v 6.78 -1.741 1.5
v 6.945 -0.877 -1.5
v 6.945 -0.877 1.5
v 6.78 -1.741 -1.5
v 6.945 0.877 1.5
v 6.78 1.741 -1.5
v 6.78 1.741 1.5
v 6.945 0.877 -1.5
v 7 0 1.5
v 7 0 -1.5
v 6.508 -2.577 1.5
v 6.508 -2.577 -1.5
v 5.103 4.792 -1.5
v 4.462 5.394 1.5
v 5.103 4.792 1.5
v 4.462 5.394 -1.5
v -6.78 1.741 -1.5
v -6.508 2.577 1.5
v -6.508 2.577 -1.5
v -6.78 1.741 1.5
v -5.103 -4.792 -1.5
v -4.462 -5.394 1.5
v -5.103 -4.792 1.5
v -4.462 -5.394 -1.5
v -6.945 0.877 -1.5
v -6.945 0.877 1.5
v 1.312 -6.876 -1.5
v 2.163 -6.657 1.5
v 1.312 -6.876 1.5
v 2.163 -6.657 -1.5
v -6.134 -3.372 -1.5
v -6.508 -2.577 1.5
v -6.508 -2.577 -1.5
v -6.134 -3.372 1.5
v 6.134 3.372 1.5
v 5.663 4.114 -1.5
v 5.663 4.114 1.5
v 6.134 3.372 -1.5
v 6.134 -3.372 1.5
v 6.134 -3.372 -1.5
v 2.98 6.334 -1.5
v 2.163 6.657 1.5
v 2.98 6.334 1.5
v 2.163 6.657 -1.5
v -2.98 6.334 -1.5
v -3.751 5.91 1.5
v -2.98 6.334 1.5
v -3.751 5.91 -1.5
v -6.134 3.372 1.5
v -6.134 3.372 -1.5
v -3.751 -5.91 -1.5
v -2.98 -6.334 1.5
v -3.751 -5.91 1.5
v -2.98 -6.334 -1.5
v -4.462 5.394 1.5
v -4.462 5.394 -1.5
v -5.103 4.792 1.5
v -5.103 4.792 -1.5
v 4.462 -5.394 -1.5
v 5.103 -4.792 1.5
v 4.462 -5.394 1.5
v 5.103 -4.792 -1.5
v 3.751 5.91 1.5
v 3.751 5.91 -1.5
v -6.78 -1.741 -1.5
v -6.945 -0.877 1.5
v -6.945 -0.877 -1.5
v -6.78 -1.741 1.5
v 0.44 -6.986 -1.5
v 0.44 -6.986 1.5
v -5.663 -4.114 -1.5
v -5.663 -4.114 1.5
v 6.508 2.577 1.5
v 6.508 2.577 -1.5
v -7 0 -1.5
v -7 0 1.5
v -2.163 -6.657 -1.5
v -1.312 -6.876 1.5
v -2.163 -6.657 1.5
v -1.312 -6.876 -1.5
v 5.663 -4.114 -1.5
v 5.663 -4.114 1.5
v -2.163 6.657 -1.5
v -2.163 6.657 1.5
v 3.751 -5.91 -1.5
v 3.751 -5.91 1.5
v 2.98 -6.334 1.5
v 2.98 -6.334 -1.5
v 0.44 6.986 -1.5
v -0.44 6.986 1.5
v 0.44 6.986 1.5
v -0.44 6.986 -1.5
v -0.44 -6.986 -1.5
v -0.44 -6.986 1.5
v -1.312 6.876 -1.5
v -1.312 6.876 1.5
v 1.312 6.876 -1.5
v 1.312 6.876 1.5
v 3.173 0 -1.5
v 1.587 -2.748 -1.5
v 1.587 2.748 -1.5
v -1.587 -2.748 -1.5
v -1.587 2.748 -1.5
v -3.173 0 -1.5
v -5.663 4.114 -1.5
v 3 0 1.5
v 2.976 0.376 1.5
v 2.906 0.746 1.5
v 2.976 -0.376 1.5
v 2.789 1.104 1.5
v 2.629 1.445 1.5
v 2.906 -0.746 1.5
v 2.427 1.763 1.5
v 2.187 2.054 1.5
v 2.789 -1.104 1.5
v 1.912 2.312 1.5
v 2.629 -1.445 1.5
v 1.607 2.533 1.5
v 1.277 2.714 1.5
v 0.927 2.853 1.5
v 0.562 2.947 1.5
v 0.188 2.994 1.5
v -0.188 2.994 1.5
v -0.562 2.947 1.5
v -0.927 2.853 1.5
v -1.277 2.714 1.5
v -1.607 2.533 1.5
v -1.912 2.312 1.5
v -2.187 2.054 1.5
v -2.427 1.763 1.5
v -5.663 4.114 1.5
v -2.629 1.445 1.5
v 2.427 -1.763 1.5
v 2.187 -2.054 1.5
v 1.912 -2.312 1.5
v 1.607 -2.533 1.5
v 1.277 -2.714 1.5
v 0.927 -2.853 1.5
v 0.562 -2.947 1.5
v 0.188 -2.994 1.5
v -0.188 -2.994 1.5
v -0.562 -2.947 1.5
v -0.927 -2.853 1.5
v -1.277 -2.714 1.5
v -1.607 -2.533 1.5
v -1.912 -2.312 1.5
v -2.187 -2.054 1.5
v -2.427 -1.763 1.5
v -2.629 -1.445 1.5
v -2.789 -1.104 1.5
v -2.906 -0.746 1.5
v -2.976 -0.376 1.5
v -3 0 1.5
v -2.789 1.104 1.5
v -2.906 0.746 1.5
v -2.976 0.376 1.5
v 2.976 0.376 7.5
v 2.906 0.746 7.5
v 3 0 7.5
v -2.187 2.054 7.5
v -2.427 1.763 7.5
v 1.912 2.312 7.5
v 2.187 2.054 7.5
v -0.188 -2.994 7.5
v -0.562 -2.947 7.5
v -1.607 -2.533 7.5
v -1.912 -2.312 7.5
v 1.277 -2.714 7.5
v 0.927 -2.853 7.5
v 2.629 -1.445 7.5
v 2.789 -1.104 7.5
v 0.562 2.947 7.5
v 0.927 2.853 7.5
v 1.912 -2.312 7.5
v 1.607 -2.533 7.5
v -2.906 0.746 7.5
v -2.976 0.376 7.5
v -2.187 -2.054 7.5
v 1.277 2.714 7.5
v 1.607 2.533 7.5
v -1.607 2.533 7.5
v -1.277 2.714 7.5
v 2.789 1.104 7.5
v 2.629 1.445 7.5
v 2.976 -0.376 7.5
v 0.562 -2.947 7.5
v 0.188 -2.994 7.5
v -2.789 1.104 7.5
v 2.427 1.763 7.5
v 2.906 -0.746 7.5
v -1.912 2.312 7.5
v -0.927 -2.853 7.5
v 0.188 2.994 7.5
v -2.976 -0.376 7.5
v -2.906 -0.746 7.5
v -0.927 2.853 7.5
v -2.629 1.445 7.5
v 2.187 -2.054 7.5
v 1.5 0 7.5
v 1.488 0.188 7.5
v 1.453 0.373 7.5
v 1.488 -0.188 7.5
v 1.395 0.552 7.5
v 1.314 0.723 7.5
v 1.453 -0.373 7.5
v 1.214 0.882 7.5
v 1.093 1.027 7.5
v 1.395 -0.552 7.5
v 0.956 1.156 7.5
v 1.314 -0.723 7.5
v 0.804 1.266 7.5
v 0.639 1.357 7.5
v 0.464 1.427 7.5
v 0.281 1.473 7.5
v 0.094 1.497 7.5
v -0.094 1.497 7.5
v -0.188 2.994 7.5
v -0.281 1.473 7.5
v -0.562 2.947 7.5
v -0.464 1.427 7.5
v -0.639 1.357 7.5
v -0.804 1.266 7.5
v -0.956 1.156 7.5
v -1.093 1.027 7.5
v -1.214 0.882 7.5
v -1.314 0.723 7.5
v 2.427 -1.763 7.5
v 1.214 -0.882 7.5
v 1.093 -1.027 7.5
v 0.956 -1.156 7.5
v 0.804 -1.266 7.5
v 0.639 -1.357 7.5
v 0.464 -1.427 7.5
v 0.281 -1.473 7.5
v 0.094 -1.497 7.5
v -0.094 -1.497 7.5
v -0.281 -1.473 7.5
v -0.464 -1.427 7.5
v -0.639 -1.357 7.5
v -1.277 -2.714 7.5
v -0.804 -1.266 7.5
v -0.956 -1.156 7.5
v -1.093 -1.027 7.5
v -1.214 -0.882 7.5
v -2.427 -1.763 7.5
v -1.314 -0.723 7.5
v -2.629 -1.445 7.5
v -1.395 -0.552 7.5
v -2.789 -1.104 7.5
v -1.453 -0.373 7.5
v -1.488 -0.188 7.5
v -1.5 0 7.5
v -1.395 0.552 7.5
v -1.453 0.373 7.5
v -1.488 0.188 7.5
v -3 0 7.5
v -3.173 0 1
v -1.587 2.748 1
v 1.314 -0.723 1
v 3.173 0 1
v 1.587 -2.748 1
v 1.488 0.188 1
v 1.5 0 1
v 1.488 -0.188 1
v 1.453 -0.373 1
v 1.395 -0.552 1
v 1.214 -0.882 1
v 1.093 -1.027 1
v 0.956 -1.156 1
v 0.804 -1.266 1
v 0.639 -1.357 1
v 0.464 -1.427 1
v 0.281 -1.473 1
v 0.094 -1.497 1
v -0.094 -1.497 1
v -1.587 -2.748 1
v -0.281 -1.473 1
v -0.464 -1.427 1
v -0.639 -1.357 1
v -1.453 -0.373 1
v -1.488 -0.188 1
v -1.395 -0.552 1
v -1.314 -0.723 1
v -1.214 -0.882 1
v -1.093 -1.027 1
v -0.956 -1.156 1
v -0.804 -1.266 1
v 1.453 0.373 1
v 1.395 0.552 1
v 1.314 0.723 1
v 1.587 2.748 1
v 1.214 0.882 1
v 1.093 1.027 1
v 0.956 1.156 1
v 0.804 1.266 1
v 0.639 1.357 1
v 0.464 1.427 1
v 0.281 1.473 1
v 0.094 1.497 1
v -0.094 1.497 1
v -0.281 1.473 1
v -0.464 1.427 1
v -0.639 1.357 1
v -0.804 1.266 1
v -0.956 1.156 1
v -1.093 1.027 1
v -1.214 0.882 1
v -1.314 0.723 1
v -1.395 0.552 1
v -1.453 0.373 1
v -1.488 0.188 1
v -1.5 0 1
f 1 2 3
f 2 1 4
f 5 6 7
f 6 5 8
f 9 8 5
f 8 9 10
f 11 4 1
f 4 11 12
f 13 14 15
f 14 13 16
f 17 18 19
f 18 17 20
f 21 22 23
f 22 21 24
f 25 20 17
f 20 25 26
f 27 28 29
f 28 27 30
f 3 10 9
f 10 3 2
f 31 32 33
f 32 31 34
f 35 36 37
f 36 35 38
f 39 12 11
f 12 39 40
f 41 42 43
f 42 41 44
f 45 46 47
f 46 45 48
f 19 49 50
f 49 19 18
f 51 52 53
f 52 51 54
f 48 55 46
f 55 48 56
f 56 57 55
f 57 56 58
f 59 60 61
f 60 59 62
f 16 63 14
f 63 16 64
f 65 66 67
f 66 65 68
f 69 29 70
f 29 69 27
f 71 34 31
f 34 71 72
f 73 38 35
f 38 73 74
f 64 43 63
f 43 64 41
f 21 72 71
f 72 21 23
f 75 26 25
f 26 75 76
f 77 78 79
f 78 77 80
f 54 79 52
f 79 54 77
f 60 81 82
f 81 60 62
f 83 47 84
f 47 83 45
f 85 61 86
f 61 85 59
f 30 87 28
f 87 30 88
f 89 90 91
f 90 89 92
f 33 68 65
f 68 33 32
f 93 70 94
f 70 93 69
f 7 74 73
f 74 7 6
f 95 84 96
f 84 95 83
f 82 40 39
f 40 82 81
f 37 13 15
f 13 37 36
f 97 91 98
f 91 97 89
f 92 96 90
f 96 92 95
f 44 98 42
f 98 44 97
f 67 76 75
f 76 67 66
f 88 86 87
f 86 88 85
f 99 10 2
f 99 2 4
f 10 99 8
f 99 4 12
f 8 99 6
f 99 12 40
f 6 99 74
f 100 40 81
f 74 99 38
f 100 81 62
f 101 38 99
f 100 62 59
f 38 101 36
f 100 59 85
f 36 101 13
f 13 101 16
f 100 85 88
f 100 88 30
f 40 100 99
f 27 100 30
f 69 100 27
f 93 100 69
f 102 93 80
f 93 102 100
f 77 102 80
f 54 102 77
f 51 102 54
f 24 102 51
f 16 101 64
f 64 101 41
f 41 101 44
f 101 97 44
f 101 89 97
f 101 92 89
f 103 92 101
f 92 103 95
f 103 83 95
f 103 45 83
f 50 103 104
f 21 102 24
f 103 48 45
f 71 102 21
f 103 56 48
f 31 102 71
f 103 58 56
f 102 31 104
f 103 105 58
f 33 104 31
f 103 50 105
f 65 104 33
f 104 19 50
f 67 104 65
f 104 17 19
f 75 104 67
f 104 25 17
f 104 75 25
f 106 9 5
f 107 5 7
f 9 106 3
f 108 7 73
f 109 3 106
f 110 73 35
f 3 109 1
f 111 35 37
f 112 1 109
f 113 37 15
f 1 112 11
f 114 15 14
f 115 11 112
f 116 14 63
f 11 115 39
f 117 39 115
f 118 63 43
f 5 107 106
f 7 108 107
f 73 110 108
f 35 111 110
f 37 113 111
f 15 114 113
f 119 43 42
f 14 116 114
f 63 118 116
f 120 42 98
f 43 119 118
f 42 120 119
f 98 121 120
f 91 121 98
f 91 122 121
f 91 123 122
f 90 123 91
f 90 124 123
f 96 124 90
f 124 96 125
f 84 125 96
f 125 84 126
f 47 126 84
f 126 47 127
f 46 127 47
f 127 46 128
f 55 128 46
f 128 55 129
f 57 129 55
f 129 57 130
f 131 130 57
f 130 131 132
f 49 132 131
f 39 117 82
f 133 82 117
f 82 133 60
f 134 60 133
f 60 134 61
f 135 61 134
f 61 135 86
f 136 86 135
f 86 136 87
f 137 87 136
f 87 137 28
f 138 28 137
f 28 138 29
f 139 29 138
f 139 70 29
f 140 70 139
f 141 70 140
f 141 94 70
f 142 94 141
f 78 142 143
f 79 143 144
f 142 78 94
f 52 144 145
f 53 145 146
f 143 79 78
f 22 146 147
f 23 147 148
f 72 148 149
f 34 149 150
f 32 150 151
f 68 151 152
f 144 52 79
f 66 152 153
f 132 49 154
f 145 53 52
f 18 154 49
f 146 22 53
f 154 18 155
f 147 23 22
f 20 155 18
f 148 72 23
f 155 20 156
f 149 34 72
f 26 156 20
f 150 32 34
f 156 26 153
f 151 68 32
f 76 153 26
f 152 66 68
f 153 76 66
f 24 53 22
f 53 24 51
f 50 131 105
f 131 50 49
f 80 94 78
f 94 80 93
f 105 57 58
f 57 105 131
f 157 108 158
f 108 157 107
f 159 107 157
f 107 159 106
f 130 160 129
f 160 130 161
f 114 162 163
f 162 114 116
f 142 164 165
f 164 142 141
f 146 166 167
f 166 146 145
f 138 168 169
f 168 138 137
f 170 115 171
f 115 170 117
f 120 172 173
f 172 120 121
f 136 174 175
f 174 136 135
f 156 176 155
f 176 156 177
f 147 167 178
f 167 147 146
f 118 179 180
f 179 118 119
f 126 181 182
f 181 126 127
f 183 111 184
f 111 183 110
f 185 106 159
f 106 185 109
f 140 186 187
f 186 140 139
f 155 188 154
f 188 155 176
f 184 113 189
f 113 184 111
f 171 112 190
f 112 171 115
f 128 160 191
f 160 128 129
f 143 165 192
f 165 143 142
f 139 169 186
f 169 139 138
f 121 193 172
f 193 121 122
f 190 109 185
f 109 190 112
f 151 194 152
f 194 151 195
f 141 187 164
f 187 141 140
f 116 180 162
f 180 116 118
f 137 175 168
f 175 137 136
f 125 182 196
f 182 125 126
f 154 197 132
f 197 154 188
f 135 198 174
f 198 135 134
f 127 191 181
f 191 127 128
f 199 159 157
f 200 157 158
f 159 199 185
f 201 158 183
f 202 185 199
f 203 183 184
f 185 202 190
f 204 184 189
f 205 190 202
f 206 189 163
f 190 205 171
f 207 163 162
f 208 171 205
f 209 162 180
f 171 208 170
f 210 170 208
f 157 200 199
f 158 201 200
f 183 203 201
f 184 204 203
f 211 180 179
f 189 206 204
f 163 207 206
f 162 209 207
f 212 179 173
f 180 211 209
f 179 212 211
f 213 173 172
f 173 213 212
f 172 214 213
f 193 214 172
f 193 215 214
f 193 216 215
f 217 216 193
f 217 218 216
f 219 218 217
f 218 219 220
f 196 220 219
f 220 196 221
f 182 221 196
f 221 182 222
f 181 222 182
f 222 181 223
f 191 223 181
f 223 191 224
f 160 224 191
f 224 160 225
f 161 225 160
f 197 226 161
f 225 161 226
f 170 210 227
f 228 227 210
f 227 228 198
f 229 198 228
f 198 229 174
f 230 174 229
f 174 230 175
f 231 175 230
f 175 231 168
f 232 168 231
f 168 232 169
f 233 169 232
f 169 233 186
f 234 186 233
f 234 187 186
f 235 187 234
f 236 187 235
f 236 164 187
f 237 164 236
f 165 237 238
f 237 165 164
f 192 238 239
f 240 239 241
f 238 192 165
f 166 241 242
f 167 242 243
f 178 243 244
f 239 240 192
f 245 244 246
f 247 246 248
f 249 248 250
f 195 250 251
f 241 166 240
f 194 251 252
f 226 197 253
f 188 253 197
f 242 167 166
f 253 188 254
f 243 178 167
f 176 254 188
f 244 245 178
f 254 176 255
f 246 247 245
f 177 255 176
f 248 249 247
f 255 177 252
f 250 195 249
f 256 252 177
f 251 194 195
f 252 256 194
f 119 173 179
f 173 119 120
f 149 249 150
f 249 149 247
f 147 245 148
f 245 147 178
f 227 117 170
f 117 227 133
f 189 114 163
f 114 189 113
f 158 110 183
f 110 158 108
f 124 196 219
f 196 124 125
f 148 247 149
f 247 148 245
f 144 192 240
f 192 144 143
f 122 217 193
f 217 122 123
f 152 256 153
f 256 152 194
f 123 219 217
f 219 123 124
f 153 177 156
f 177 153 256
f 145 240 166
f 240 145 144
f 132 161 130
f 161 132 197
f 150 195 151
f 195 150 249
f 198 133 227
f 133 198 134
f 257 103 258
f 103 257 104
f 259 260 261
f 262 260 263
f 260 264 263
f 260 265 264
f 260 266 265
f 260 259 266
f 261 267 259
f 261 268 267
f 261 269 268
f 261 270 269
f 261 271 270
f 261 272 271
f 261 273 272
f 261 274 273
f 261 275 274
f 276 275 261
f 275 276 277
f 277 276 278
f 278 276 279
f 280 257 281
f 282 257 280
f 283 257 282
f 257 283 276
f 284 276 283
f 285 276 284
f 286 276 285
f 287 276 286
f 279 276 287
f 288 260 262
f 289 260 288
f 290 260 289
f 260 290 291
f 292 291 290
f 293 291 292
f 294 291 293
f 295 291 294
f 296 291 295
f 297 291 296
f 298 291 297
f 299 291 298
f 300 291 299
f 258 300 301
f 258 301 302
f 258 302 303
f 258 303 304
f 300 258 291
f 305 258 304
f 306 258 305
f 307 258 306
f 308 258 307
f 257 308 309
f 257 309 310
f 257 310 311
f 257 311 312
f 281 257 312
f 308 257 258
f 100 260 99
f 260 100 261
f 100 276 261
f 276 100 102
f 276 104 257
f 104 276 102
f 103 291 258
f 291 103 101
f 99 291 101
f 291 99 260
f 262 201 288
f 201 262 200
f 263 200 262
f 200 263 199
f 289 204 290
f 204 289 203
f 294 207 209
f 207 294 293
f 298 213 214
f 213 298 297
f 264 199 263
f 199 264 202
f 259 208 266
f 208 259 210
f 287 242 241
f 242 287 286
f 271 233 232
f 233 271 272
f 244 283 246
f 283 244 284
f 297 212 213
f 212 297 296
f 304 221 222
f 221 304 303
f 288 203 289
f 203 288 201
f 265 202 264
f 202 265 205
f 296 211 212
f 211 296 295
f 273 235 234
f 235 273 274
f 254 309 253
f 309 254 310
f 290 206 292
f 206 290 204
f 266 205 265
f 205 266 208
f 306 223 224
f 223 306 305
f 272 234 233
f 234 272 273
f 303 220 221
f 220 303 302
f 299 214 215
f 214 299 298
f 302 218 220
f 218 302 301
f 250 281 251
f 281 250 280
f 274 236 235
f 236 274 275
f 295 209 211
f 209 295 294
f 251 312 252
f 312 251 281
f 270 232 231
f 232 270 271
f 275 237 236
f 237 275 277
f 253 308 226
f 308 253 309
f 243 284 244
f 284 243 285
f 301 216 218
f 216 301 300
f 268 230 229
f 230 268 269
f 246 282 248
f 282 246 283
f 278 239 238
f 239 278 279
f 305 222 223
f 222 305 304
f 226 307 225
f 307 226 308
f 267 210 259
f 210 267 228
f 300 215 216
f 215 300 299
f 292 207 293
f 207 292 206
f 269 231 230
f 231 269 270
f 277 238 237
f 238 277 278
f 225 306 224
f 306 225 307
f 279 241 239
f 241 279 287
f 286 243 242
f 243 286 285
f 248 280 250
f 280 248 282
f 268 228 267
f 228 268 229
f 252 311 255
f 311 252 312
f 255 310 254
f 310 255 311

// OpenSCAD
$fn = 50;


difference() {
	union() {
		translate(v = [0, 0, -1.5000000000]) {
			cylinder(h = 3, r = 7.0000000000);
		}
		translate(v = [0, 0, -1.5000000000]) {
			cylinder(h = 9, r = 3.0000000000);
		}
	}
	union() {
		translate(v = [0, 0, -1.5000000000]) {
			rotate(a = [0, 0, 0]) {
				difference() {
					union() {
						#linear_extrude(height = 2.5000000000) {
							polygon(points = [[3.1735000000, 0.0000000000], [1.5867500000, 2.7483316189], [-1.5867500000, 2.7483316189], [-3.1735000000, 0.0000000000], [-1.5867500000, -2.7483316189], [1.5867500000, -2.7483316189]]);
						}
					}
					union();
				}
			}
		}
		translate(v = [0, 0, -50.0000000000]) {
			cylinder(h = 100, r = 1.5000000000);
		}
	}
}
